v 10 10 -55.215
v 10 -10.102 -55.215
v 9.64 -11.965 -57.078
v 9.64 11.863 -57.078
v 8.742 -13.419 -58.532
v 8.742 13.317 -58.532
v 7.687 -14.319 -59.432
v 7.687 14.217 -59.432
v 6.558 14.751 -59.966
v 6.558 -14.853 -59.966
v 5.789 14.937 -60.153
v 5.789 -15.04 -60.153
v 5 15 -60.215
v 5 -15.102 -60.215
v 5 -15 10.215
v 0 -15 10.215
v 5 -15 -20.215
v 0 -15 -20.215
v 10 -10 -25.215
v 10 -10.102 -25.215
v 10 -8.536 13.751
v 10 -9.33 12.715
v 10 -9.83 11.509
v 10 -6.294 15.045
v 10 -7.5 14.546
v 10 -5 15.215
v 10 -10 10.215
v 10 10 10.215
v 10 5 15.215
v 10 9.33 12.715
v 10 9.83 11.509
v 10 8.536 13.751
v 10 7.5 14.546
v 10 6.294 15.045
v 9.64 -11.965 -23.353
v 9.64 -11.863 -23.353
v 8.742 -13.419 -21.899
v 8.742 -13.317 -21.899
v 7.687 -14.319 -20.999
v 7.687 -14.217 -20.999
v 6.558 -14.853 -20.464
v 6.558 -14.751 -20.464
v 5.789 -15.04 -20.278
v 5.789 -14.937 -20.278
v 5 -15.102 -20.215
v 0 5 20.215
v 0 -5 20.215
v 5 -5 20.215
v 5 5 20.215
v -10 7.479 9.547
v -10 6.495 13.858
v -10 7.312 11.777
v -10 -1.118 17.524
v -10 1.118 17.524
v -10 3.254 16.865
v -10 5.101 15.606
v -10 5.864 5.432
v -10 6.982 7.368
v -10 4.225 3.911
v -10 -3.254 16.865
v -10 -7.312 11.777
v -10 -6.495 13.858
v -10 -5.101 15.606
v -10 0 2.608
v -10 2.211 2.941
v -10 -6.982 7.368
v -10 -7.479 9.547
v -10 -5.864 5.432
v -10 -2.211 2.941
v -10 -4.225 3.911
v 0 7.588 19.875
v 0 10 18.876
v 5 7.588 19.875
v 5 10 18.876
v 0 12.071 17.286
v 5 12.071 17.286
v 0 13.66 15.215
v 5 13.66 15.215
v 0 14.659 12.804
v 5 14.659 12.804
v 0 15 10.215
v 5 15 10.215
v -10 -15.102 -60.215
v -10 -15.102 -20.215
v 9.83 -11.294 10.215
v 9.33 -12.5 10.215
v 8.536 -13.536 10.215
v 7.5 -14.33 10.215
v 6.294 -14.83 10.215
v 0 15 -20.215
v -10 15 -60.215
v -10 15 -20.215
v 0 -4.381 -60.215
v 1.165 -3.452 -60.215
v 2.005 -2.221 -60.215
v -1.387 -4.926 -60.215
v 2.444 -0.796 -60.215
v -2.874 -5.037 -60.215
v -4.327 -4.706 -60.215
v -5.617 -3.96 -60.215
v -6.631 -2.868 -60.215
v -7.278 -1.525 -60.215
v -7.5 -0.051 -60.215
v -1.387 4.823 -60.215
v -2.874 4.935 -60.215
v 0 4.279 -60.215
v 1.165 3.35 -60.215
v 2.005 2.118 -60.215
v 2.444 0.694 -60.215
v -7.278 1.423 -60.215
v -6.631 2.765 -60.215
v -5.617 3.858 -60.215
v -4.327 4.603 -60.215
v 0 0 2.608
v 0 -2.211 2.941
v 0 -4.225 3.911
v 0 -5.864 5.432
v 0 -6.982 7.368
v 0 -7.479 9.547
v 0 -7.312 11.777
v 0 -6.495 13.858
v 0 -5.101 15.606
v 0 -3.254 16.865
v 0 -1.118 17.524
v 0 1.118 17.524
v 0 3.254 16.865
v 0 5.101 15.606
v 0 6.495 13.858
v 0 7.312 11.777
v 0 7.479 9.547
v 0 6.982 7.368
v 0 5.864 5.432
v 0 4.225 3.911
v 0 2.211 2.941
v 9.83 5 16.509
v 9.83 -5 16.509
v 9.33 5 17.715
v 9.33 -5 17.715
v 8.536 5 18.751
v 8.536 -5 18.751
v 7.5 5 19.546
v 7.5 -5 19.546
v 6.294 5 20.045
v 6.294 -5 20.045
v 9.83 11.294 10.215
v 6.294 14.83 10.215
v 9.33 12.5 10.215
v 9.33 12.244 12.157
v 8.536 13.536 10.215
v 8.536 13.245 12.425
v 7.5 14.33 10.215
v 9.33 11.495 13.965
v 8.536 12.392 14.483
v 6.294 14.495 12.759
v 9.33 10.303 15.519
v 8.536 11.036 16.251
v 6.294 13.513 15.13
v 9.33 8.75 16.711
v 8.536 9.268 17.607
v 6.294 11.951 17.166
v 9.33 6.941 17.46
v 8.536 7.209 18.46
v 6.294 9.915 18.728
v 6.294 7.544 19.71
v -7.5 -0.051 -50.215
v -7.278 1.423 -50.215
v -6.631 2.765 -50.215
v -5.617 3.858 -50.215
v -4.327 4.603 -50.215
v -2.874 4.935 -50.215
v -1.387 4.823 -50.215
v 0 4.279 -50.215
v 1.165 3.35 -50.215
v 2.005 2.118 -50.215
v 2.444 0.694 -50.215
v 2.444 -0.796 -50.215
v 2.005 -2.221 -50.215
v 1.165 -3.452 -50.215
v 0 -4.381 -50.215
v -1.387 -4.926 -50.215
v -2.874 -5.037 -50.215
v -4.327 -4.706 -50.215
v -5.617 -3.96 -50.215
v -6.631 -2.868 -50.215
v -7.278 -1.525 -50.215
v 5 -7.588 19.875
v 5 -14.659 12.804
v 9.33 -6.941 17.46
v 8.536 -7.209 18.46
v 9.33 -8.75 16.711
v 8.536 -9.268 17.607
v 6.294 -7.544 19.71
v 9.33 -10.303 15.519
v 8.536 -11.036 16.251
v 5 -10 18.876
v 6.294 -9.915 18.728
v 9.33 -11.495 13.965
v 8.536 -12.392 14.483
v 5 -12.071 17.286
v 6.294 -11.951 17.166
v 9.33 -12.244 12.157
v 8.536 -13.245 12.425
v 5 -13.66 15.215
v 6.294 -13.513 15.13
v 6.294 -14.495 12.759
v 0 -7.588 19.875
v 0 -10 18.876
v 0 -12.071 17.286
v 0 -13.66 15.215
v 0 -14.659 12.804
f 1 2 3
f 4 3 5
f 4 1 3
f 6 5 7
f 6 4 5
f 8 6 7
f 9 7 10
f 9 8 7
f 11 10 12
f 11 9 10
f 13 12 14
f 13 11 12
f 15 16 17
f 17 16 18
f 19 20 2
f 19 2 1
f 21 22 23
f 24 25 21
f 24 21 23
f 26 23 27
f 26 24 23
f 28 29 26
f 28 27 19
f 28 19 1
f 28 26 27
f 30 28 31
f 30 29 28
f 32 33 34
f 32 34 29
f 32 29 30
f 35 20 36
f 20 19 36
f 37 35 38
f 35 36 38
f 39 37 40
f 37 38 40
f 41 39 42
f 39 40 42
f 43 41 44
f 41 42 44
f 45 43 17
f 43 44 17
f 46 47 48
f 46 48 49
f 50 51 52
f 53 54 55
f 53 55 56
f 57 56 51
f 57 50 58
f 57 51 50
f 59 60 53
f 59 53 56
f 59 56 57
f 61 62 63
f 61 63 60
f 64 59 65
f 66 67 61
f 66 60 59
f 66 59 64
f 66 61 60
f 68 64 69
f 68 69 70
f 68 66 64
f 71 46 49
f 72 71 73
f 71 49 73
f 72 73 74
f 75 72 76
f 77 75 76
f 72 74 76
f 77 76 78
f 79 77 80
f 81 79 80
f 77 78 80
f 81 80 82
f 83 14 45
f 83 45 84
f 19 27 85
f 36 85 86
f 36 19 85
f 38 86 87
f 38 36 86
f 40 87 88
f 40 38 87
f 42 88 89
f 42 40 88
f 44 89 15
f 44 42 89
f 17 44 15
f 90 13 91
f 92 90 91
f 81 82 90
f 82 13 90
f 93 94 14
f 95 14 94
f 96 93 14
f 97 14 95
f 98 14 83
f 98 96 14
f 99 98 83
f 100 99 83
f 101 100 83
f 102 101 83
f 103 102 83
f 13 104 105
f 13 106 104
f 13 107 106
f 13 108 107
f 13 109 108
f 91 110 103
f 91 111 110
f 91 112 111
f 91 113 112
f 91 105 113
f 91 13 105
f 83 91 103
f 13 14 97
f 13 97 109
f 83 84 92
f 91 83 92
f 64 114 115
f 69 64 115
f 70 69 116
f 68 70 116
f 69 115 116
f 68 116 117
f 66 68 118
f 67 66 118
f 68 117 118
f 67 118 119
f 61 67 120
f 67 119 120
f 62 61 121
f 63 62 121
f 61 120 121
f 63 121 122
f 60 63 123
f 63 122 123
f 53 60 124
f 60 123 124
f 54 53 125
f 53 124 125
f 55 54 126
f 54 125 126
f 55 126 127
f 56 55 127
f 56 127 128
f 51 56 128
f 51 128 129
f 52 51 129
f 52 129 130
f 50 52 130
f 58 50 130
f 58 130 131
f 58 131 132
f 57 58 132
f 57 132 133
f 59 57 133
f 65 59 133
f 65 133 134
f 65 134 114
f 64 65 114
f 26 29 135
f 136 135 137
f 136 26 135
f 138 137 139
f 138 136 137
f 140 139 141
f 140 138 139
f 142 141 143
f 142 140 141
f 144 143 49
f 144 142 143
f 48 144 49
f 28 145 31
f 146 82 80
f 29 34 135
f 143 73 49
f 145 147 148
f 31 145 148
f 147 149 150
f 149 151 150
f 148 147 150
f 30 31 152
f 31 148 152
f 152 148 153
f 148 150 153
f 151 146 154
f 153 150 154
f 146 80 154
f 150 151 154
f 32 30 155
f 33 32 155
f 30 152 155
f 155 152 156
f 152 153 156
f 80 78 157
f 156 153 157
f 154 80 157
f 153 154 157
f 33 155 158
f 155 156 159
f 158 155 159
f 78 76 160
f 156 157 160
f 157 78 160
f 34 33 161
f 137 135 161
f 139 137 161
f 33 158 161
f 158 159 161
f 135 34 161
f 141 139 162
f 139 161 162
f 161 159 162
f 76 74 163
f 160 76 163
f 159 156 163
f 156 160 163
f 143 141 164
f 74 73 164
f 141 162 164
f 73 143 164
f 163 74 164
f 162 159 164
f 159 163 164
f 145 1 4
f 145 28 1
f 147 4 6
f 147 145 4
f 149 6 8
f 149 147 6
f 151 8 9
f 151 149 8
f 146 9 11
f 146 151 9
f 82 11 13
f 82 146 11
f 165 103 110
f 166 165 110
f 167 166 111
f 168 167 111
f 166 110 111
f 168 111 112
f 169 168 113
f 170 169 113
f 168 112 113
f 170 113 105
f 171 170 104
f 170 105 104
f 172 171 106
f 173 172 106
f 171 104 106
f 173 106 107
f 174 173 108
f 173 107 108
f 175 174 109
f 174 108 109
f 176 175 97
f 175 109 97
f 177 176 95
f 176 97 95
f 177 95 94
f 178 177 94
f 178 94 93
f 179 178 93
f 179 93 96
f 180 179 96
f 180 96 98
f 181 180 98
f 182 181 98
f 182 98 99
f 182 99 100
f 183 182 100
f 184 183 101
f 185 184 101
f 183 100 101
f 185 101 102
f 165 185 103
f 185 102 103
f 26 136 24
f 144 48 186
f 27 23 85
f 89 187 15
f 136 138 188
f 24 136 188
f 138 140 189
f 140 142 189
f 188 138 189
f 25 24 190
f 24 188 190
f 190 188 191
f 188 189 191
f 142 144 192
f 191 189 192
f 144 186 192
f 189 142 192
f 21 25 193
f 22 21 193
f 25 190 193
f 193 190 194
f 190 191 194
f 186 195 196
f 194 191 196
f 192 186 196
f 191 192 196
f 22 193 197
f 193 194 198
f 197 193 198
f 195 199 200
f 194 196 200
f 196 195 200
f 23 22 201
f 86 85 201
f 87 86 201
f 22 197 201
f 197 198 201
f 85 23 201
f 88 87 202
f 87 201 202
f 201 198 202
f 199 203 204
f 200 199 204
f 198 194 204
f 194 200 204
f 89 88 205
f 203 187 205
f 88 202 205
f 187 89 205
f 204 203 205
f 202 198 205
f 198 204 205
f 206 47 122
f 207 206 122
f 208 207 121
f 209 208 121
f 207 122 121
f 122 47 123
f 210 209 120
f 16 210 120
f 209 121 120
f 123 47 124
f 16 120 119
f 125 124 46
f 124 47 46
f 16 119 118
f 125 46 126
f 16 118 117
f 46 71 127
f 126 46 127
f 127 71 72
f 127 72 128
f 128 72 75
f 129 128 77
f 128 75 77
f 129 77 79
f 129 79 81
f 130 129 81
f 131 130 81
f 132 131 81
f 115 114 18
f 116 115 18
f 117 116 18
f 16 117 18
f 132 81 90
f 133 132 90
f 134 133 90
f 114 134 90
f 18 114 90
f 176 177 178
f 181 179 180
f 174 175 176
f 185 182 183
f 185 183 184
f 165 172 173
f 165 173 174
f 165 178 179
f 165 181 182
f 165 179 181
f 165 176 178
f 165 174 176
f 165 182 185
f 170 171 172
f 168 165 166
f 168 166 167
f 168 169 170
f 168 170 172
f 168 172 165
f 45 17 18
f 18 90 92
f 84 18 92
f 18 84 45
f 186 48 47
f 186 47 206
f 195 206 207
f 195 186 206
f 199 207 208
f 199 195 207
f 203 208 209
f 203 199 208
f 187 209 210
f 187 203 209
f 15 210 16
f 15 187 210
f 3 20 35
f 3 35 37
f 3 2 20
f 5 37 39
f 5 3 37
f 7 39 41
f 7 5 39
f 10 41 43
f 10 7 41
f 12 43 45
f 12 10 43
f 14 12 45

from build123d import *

# Parameters (mm, degrees)
SKETCH1_W           = 40.43076923
SKETCH1_H           = 30
BOSS_EXTRUDE1_DEPTH = 10
SKETCH2_R           = 7.5
BOSS_EXTRUDE2_DEPTH = 20
FILLET1_R           = 10
CUT_EXTRUDE1_START  = -10
SKETCH3_R           = 7.5
CUT_EXTRUDE1_DEPTH  = 10
SKETCH4_W           = 20
SKETCH4_H           = 30.102362665
BOSS_EXTRUDE3_DEPTH = 40
FILLET2_R           = 5
SKETCH5_R           = 5
CUT_EXTRUDE2_DEPTH  = 10


with BuildPart() as part:
    # Sketch1 → Boss-Extrude1 (new body)
    with BuildSketch(Plane(origin=(0, 0, 0), x_dir=(0, 0, -1), z_dir=(1, 0, 0))):
        Rectangle(SKETCH1_W, SKETCH1_H)
    extrude(amount=BOSS_EXTRUDE1_DEPTH)

    # Sketch2 → Boss-Extrude2 (add)
    with BuildSketch(Plane.ZY):
        with Locations(Location((10.107692308, 0, 0), (0, 0, 180))):
            Circle(SKETCH2_R)
    extrude(amount=BOSS_EXTRUDE2_DEPTH)

    # Fillet1
    fillet1_edges = [part.edges().sort_by_distance(p)[0] for p in [
        (5, -15, 20.215384615),
        (5, 15, 20.215384615),
    ]]
    fillet(fillet1_edges, radius=FILLET1_R)

    # Sketch3 → Cut-Extrude1 (cut)
    with BuildSketch(Plane.ZY.offset(20).offset(CUT_EXTRUDE1_START)):
        with Locations(Location((10.107692308, 0, 0), (0, 0, 180))):
            Circle(SKETCH3_R)
    extrude(amount=CUT_EXTRUDE1_DEPTH, mode=Mode.SUBTRACT)

    # Sketch4 → Boss-Extrude3 (add)
    with BuildSketch(Plane(origin=(0, 0, -20.215384615), x_dir=(-1, 0, 0), z_dir=(0, 0, -1))):
        with Locations((0, -0.051181332)):
            Rectangle(SKETCH4_W, SKETCH4_H)
    extrude(amount=BOSS_EXTRUDE3_DEPTH)

    # Fillet2
    fillet2_edges = [part.edges().sort_by_distance(p)[0] for p in [
        (10, -15, -5),
        (10, 0, 20.215384615),
        (10, 12.071067812, 17.286452427),
        (10, -12.071067812, 17.286452427),
        (10, -15.051181332, -20.215384615),
        (10, -15.102362665, -40.215384615),
        (10, -0.051181332, -60.215384615),
        (10, 15, -25),
    ]]
    fillet(fillet2_edges, radius=FILLET2_R)

    # Sketch5 → Cut-Extrude2 (cut)
    with BuildSketch(Plane(origin=(0, 0, -60.215384615), x_dir=(-1, 0, 0), z_dir=(0, 0, -1))):
        with Locations((2.5, -0.051181332)):
            Circle(SKETCH5_R)
    extrude(amount=-CUT_EXTRUDE2_DEPTH, mode=Mode.SUBTRACT)


solid = part.part
